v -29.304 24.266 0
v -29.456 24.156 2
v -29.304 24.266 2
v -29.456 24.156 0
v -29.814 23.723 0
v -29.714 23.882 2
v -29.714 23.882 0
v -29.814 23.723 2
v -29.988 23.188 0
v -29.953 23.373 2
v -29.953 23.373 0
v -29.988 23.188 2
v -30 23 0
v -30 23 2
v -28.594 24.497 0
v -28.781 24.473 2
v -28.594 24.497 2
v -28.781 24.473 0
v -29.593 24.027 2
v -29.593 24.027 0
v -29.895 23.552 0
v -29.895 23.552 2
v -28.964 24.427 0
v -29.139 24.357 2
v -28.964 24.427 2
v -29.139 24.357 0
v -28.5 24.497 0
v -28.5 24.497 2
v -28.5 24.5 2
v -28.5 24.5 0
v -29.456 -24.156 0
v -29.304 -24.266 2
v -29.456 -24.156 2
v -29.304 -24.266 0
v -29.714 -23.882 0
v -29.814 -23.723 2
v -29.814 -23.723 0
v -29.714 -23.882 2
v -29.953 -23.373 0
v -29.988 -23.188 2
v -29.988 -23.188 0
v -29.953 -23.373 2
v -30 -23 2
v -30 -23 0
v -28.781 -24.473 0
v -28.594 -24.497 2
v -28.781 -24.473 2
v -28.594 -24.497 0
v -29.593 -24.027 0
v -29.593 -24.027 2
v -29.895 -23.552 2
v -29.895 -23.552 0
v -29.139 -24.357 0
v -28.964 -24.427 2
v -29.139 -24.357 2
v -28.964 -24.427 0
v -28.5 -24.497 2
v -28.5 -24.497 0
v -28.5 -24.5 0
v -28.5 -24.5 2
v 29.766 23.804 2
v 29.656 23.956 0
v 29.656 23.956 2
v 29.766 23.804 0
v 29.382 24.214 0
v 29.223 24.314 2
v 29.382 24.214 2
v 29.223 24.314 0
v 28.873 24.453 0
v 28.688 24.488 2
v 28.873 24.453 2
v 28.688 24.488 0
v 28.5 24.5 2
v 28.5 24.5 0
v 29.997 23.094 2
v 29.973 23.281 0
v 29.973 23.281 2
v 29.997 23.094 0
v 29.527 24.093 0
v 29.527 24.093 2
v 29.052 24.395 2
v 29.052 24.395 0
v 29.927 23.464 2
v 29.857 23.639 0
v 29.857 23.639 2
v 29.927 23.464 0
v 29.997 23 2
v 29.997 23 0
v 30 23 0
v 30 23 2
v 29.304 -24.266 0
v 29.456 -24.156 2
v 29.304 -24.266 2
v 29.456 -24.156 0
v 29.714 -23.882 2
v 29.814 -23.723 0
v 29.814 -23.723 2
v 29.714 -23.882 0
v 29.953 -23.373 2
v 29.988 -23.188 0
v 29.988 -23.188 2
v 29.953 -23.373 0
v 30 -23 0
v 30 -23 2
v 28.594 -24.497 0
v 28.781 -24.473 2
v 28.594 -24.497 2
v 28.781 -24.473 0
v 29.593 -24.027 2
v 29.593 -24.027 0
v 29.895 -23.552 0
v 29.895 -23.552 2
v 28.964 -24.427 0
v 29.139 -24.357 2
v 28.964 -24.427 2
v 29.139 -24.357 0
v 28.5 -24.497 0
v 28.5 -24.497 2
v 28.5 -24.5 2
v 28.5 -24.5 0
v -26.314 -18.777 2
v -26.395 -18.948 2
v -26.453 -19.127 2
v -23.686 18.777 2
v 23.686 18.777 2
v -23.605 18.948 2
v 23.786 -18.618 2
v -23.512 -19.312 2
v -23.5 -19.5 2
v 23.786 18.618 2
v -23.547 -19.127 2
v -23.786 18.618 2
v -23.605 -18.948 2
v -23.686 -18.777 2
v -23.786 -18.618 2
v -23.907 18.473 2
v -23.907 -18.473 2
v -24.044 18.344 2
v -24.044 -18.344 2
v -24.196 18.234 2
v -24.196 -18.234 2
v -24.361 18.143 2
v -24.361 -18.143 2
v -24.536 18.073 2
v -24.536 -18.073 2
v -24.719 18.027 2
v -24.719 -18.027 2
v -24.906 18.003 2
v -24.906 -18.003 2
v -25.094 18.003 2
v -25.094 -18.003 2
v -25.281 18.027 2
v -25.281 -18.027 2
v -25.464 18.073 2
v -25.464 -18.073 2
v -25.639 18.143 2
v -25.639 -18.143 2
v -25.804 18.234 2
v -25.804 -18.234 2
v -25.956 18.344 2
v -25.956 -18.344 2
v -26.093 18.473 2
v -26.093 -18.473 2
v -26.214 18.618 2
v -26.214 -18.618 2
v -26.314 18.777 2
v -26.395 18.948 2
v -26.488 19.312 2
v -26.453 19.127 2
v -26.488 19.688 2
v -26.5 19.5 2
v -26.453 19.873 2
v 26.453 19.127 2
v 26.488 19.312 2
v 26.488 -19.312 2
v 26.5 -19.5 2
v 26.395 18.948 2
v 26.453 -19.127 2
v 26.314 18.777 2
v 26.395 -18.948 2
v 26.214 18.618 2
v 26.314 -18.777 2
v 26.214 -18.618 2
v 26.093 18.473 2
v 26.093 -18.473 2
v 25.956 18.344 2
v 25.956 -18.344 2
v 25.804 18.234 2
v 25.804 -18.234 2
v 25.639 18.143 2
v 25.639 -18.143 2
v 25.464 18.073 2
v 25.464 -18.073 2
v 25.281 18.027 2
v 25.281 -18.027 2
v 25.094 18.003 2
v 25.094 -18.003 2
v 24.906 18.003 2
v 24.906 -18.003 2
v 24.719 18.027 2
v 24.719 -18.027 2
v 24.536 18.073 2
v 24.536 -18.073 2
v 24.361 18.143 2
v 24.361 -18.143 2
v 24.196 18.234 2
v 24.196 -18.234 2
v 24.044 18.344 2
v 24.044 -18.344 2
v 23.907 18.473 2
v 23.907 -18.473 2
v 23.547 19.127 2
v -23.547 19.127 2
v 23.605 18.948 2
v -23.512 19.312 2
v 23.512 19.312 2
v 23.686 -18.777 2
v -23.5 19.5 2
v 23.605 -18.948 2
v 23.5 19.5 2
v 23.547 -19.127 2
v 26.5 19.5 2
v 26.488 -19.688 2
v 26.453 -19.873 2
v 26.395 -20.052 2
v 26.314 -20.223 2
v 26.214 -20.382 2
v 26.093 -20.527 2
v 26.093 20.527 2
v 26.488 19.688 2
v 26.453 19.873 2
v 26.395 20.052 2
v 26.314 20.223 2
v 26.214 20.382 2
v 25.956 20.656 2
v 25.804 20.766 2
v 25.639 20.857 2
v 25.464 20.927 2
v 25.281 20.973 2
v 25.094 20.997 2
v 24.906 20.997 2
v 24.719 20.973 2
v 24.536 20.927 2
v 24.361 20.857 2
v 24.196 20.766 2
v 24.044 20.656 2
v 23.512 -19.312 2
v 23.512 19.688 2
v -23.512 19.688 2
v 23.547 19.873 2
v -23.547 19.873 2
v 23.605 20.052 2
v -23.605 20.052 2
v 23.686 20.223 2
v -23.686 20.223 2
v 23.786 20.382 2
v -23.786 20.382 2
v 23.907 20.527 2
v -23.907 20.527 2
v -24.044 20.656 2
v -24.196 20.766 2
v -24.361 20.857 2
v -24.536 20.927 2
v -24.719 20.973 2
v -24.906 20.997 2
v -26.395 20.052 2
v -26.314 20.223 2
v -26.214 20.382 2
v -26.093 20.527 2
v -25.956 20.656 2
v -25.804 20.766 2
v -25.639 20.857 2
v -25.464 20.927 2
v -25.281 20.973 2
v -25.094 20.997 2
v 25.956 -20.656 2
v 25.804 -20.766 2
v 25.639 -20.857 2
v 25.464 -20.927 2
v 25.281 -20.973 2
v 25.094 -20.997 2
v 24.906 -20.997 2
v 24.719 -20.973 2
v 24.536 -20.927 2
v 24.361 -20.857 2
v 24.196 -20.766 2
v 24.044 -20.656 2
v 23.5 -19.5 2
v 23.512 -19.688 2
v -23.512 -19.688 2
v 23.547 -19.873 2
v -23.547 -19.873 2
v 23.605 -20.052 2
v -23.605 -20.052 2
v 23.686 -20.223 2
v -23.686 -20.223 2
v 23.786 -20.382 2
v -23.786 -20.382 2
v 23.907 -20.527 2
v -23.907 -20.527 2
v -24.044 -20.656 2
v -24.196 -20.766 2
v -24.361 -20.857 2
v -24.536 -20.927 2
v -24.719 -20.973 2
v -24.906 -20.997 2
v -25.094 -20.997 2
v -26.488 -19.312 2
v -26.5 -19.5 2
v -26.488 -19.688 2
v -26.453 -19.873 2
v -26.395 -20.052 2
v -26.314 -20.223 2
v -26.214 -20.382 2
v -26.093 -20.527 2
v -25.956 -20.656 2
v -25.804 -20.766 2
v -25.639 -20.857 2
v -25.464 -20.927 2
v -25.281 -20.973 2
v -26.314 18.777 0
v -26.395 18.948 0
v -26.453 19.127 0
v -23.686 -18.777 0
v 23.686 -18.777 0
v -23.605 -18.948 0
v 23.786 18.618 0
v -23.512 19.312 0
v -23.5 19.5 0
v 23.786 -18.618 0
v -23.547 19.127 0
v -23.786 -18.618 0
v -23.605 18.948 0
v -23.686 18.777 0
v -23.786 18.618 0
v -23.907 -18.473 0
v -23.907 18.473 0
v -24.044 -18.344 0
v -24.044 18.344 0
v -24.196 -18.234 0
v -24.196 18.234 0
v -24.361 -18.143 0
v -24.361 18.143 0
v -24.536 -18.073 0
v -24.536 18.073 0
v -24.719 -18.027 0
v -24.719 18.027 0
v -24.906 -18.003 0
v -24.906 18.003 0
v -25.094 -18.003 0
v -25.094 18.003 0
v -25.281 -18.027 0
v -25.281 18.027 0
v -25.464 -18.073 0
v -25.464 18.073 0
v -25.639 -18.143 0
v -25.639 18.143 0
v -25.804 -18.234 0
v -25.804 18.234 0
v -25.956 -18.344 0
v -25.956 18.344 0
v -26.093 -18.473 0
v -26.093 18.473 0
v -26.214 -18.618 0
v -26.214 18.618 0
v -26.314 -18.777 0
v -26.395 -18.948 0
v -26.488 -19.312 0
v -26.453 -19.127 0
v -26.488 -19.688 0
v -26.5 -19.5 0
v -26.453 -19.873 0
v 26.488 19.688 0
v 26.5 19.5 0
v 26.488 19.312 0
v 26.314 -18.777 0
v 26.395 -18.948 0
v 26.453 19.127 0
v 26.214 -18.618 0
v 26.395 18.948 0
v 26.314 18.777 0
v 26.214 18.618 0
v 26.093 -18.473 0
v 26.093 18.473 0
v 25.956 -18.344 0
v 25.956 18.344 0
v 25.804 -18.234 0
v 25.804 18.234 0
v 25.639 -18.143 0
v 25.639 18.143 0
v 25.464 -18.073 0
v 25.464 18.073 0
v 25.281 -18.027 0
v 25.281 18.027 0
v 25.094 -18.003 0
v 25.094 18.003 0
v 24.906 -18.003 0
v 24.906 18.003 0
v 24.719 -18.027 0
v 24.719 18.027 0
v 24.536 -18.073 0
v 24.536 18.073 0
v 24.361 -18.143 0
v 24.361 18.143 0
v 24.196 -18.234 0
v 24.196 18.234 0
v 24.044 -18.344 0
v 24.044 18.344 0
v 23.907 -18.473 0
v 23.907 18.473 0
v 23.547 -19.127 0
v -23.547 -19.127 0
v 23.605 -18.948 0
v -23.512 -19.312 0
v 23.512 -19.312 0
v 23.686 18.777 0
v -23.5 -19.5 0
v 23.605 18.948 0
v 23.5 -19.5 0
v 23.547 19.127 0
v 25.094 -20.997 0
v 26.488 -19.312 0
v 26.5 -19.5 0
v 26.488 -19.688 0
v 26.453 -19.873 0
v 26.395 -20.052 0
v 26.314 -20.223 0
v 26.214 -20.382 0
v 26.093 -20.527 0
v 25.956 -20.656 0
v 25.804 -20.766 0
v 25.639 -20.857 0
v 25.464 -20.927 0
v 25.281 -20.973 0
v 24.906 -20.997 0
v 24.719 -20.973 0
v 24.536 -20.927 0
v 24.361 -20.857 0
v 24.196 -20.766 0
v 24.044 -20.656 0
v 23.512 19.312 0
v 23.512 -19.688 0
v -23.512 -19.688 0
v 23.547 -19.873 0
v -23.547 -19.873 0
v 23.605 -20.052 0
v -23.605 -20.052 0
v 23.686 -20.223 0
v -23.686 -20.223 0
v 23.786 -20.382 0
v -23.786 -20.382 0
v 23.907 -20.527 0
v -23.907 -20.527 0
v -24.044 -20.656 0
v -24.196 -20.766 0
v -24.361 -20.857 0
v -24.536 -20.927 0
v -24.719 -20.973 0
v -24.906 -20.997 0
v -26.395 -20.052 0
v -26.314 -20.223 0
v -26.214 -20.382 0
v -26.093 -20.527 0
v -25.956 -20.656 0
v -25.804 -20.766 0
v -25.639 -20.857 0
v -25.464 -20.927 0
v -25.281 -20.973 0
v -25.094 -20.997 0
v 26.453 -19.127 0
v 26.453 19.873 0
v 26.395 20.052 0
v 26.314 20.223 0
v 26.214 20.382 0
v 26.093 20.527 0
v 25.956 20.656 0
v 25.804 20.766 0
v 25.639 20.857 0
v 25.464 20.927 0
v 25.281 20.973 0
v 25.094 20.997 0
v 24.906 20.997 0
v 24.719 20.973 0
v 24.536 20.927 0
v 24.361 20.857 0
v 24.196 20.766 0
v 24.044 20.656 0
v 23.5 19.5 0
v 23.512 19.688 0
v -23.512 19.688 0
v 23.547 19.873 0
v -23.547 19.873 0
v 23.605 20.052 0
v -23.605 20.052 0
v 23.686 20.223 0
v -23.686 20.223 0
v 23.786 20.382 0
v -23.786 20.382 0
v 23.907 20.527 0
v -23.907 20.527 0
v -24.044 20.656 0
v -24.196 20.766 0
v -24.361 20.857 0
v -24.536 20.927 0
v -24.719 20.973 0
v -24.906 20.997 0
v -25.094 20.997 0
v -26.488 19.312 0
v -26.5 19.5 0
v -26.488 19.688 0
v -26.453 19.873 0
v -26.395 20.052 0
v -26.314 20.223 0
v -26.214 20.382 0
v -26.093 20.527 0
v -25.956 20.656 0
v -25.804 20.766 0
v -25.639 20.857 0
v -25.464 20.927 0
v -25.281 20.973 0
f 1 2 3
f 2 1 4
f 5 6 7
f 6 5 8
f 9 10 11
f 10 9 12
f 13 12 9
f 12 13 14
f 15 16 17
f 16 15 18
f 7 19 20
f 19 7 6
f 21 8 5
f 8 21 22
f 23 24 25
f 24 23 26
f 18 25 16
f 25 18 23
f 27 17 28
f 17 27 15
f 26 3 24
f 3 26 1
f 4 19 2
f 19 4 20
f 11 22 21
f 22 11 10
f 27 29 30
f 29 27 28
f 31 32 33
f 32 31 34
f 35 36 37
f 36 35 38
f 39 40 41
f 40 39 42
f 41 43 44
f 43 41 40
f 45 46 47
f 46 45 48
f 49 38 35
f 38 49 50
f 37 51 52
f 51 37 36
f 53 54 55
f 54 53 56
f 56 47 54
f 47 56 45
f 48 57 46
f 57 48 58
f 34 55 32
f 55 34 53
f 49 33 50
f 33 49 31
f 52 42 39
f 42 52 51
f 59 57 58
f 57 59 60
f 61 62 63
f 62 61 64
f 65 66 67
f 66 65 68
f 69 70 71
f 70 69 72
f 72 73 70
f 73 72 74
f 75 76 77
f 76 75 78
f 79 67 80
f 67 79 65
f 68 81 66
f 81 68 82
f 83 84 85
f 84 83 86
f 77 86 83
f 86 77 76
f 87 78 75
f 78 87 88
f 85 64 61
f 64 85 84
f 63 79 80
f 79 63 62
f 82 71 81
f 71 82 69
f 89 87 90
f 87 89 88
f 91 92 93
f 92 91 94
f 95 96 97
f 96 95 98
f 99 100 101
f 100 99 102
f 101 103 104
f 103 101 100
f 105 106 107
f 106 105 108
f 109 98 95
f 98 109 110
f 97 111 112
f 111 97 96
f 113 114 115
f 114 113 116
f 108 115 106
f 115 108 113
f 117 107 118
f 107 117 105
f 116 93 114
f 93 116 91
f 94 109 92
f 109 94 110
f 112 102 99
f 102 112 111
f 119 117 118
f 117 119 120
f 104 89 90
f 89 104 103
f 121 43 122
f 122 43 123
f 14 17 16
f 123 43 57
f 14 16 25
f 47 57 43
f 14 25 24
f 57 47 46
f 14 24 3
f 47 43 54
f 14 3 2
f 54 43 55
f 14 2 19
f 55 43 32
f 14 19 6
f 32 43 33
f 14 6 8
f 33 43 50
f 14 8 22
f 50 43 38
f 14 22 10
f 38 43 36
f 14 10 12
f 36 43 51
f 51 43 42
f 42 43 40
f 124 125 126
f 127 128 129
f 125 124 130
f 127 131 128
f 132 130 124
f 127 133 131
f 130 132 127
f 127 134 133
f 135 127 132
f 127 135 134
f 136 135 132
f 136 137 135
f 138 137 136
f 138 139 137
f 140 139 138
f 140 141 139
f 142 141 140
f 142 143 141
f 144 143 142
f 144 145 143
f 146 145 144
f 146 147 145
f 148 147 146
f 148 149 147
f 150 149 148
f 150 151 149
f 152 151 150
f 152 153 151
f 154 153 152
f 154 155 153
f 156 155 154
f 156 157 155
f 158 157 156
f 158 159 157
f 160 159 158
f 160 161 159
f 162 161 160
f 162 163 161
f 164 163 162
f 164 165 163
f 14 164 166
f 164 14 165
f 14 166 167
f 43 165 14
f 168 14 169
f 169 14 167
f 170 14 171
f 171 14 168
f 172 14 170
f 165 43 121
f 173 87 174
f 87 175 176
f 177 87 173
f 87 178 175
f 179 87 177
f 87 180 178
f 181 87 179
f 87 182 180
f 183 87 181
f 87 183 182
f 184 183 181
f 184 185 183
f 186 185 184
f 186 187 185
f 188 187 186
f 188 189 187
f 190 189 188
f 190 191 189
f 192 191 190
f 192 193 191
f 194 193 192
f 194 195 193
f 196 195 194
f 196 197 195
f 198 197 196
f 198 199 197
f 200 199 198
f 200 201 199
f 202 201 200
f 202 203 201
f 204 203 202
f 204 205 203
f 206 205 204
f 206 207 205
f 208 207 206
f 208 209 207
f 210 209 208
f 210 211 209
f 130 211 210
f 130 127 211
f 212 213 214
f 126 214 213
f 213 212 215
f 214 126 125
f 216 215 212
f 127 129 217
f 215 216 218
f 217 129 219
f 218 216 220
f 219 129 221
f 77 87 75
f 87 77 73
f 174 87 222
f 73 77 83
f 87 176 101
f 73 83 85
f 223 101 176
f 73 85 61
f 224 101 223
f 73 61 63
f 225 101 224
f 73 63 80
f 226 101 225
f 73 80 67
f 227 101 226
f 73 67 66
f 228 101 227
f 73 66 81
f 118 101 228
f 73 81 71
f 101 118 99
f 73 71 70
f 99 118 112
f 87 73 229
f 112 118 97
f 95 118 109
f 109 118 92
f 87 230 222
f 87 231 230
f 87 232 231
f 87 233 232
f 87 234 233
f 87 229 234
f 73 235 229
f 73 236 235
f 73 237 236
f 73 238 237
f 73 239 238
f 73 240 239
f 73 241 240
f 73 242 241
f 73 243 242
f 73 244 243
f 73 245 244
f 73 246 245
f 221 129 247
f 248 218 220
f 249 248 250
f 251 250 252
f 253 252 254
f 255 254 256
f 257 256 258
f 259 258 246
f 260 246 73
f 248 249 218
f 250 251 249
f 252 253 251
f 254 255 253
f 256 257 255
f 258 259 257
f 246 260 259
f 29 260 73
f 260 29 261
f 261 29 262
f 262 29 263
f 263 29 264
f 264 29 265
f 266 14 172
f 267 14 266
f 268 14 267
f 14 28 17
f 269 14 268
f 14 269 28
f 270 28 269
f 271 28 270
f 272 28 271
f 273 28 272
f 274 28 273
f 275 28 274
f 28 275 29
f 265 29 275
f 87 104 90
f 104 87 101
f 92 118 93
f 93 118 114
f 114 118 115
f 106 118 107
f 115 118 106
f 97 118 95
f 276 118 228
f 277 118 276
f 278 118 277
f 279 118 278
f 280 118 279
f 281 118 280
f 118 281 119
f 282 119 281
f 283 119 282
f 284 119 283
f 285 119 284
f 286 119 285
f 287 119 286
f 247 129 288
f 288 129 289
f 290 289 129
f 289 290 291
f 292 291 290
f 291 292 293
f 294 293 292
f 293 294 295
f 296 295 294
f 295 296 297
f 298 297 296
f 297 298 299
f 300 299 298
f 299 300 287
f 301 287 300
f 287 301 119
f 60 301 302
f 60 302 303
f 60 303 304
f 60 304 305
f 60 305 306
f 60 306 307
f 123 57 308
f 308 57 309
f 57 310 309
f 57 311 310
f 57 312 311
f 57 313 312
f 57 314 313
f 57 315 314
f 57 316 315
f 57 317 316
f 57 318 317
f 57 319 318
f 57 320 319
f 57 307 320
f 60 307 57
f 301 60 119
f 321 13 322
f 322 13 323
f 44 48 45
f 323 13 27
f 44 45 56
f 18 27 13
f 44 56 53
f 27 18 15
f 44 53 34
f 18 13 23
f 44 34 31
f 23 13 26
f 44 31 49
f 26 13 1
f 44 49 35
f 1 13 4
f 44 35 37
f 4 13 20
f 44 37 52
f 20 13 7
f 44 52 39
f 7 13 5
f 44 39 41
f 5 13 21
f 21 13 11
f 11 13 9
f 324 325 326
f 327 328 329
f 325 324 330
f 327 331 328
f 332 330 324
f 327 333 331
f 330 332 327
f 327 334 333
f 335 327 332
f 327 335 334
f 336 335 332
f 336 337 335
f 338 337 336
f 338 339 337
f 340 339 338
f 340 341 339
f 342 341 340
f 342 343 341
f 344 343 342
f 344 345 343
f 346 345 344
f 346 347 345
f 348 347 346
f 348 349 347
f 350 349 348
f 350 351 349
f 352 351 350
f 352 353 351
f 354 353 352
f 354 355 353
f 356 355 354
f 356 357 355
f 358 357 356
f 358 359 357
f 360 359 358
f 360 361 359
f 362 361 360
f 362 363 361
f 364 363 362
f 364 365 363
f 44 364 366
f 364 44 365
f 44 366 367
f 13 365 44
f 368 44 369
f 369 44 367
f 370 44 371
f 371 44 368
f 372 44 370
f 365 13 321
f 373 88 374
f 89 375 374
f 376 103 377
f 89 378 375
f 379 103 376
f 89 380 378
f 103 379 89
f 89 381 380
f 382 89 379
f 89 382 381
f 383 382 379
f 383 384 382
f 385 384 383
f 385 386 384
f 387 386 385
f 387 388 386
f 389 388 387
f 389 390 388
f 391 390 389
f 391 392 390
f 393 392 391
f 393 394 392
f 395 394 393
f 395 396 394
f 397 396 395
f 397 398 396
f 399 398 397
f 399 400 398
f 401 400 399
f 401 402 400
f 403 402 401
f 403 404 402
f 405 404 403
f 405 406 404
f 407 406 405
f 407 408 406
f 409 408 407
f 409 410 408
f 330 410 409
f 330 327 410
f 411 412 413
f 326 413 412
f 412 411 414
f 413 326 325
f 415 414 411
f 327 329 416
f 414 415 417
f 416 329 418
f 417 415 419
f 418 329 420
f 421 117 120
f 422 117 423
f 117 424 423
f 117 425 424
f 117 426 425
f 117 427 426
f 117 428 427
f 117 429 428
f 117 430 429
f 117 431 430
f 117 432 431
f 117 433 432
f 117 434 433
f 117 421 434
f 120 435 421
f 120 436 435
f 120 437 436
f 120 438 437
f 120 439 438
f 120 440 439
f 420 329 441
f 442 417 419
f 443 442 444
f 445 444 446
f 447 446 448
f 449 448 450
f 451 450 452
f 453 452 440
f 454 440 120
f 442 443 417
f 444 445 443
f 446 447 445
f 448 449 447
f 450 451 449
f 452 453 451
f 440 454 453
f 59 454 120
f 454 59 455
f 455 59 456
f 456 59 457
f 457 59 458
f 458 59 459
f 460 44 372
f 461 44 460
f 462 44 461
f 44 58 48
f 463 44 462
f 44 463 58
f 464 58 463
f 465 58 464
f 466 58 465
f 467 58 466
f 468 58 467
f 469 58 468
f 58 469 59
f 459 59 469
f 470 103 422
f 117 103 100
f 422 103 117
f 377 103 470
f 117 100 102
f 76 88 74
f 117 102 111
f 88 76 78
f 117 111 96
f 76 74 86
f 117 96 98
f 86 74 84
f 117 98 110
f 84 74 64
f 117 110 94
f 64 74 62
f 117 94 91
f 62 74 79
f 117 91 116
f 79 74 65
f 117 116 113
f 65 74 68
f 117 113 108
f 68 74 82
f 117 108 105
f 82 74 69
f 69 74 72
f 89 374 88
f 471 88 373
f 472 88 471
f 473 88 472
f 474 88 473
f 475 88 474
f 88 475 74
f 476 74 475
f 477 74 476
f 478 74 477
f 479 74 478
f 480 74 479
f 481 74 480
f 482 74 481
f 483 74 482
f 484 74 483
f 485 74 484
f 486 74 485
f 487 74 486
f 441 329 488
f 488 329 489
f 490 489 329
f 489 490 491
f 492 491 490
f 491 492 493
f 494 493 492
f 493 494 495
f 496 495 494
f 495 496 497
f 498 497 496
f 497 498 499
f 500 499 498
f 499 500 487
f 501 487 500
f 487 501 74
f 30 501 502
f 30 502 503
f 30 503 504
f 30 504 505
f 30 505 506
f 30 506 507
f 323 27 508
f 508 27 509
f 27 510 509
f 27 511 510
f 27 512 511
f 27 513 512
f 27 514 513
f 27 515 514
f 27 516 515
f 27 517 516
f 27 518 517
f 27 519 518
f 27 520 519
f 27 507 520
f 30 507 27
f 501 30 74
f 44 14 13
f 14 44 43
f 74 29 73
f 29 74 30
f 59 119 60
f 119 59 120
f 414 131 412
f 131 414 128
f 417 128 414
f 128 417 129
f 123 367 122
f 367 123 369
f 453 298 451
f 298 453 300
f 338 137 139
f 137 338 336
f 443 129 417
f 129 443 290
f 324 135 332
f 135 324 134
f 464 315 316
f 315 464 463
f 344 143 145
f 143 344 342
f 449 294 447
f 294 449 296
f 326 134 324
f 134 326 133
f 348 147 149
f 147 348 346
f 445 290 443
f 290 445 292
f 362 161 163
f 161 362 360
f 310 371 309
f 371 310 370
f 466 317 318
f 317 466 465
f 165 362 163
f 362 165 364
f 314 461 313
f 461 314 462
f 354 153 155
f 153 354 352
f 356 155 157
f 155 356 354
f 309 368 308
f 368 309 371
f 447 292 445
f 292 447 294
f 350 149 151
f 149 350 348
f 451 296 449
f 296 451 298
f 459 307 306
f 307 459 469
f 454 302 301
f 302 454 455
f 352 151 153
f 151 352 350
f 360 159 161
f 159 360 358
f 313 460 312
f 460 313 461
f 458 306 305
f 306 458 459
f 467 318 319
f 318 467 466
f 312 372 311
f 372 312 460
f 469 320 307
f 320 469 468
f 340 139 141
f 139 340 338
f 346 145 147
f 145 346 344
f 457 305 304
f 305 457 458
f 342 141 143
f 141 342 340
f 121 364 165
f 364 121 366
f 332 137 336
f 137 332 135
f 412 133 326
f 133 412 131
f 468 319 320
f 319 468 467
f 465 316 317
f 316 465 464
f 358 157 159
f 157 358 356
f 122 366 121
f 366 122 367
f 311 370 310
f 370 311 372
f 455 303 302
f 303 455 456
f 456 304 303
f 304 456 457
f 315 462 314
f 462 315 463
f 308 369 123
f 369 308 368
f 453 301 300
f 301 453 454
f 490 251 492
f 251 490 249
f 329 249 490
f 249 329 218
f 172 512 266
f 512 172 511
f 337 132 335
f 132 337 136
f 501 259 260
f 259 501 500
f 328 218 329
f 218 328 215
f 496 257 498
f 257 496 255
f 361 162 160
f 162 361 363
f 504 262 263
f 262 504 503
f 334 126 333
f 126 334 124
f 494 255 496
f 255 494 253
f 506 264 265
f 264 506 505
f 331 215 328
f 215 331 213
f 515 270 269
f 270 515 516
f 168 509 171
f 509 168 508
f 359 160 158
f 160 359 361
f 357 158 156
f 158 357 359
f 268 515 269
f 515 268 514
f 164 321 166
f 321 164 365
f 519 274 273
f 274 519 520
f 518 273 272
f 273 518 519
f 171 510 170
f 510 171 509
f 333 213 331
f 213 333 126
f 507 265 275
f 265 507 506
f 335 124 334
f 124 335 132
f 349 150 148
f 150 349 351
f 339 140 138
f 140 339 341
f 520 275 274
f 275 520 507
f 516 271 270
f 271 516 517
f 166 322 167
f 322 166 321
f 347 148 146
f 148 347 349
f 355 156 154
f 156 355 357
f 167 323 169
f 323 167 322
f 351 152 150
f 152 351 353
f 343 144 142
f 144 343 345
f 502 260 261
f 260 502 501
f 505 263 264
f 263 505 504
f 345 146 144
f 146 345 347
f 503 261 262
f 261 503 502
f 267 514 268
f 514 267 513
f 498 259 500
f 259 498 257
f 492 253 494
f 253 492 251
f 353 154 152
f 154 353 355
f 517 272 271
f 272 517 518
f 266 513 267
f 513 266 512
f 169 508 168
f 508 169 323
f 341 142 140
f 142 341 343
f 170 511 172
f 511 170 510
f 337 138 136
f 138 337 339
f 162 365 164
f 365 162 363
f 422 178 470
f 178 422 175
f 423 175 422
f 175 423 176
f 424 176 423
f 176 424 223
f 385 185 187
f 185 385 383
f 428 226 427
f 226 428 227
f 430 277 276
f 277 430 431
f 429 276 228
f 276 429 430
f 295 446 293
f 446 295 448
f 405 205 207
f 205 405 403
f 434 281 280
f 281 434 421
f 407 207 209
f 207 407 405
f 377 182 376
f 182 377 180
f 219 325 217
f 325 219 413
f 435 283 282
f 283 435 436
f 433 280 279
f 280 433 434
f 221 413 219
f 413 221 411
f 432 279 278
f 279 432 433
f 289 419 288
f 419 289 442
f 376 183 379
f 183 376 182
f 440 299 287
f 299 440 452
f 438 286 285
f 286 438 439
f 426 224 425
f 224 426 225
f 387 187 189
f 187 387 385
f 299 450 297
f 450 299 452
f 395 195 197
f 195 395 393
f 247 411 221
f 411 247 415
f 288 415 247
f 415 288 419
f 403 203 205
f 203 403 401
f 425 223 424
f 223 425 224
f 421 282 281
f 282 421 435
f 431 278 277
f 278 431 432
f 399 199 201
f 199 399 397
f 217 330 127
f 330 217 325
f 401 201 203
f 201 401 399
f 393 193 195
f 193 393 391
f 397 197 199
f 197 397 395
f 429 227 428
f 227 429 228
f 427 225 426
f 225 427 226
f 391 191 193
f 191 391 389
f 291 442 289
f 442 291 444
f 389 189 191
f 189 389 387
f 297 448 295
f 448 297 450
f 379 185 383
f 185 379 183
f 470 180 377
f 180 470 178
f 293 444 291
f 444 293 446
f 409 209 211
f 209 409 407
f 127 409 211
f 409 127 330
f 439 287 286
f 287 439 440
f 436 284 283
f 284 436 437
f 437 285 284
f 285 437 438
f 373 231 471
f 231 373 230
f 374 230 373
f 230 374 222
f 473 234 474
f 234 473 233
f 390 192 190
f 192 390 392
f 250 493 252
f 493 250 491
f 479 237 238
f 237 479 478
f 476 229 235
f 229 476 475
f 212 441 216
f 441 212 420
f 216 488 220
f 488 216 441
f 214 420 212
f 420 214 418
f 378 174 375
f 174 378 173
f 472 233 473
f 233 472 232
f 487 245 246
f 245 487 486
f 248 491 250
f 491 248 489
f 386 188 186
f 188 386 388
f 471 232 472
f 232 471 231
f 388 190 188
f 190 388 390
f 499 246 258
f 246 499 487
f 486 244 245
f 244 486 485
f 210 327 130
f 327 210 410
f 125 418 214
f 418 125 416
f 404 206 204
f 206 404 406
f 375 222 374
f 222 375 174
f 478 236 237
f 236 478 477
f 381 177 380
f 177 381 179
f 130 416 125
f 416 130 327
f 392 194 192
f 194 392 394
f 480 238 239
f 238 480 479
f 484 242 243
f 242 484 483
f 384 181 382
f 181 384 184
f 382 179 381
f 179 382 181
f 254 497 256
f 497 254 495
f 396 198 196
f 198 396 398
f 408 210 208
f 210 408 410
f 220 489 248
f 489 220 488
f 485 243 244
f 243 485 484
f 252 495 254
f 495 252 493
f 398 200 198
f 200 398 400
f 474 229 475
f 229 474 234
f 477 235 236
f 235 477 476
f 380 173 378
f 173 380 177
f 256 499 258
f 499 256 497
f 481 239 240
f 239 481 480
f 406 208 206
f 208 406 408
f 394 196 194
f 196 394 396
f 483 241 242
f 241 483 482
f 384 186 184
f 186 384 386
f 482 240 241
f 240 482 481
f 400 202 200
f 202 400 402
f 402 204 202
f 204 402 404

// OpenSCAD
// file: ../LIB/round_corner_mask.scad
// Copyright (c) 2014 Jérémie DECOCK <jd.jdhp@gmail.com>

module round_corner_mask(radius, spacing_x, spacing_y, height) {
	$fn=50;
	
    difference() {
        cube([2*radius+1, 2*radius+1, height], center=true);
        union() {
            cylinder(r=radius, h=height+2, center=true);
            translate([(radius+2)/2, 0, 0]) cube([radius+2, 2*radius+2, height+2], center=true);
            translate([0, (radius+2)/2, 0]) cube([2*radius+2, radius+2, height+2], center=true);
        }
    }
}

module board_round_4_corner_mask(radius, width, depth, height) {
    spacing_x = width - 2 * radius;
    spacing_y = depth - 2 * radius;
    height = height + 1;

    translate([-spacing_x/2,  spacing_y/2, 0]) mirror([0,1,0]) round_corner_mask(radius, spacing_x, spacing_y, height);
    translate([-spacing_x/2, -spacing_y/2, 0]) mirror([0,0,0]) round_corner_mask(radius, spacing_x, spacing_y, height);
    translate([ spacing_x/2,  spacing_y/2, 0]) mirror([1,1,0]) round_corner_mask(radius, spacing_x, spacing_y, height);
    translate([ spacing_x/2, -spacing_y/2, 0]) mirror([1,0,0]) round_corner_mask(radius, spacing_x, spacing_y, height);
}

module board_round_2_corner_mask(radius, width, depth, height) {
    spacing_x = width - 2 * radius;
    spacing_y = depth - 2 * radius;
    height = height + 1;

    translate([ spacing_x/2,  spacing_y/2, 0]) mirror([1,1,0]) round_corner_mask(radius, spacing_x, spacing_y, height);
    translate([ spacing_x/2, -spacing_y/2, 0]) mirror([1,0,0]) round_corner_mask(radius, spacing_x, spacing_y, height);
}
// file: ../LIB/rounded_corner_board.scad
// Rounded board

// Copyright (c) 2014 Jérémie DECOCK <jd.jdhp@gmail.com>

use <round_corner_mask.scad>

/////////////////////////////////////////////

module 4_rounded_corners_board(board_width, board_depth, board_height, board_corner_radius) {
    difference() {
        cube([board_width, board_depth, board_height], center=true);
        #board_round_4_corner_mask(radius=board_corner_radius, width=board_width, depth=board_depth, height=board_height);
    }
}

module 2_rounded_corners_board(board_width, board_depth, board_height, board_corner_radius) {
    difference() {
        cube([board_width, board_depth, board_height], center=true);
        #board_round_2_corner_mask(radius=board_corner_radius, width=board_width, depth=board_depth, height=board_height);
    }
}

//4_rounded_corners_board(board_width=80, board_depth=40, board_height=3, board_corner_radius=3);
2_rounded_corners_board(board_width=80, board_depth=40, board_height=3, board_corner_radius=3);
// file: ../LIB/four_screw_holes.scad
// Copyright (c) 2014 Jérémie DECOCK <jd.jdhp@gmail.com>

/////////////////////////////////////////////

module four_screw_holes(radius, spacing_x, spacing_y, height) {
	for (i = [-1, 1]) {    
        for (j = [-1, 1]) {    
            translate([i*spacing_x/2, j*spacing_y/2, 0]) {        
                cylinder(r=radius, h=height, center=true, $fn=50);
            }
        }
	}
}
// main file
// Raspberry Pi GPIO breakout board protection (model B).

// Copyright (c) 2014 Jérémie DECOCK <jd.jdhp@gmail.com>

use <../LIB/four_screw_holes.scad>
use <../LIB/rounded_corner_board.scad>

/////////////////////////////////////////////

module protection_board(board_height,
                        board_corner_radius,
                        screw_holes_radius,
                        screw_holes_spacing_x,
                        screw_holes_spacing_y) {

    board_width = screw_holes_spacing_x + 10;
    board_depth = screw_holes_spacing_y + 10;

    difference() {
        4_rounded_corners_board(board_width=board_width, board_depth=board_depth, board_height=board_height, board_corner_radius=board_corner_radius);
        #four_screw_holes(screw_holes_radius, screw_holes_spacing_x, screw_holes_spacing_y, board_height+1);
    }
}

/////////////////////////////////////////////

screw_holes_radius = 1.5;
screw_holes_spacing_x = 50;
screw_holes_spacing_y = 39;
board_corner_radius = 1.5;
board_height = 2;

translate([0, 0, board_height/2]) {
    protection_board(board_height=board_height,
                     board_corner_radius=board_corner_radius,
                     screw_holes_radius=screw_holes_radius,
                     screw_holes_spacing_x=screw_holes_spacing_x,
                     screw_holes_spacing_y=screw_holes_spacing_y);
}
